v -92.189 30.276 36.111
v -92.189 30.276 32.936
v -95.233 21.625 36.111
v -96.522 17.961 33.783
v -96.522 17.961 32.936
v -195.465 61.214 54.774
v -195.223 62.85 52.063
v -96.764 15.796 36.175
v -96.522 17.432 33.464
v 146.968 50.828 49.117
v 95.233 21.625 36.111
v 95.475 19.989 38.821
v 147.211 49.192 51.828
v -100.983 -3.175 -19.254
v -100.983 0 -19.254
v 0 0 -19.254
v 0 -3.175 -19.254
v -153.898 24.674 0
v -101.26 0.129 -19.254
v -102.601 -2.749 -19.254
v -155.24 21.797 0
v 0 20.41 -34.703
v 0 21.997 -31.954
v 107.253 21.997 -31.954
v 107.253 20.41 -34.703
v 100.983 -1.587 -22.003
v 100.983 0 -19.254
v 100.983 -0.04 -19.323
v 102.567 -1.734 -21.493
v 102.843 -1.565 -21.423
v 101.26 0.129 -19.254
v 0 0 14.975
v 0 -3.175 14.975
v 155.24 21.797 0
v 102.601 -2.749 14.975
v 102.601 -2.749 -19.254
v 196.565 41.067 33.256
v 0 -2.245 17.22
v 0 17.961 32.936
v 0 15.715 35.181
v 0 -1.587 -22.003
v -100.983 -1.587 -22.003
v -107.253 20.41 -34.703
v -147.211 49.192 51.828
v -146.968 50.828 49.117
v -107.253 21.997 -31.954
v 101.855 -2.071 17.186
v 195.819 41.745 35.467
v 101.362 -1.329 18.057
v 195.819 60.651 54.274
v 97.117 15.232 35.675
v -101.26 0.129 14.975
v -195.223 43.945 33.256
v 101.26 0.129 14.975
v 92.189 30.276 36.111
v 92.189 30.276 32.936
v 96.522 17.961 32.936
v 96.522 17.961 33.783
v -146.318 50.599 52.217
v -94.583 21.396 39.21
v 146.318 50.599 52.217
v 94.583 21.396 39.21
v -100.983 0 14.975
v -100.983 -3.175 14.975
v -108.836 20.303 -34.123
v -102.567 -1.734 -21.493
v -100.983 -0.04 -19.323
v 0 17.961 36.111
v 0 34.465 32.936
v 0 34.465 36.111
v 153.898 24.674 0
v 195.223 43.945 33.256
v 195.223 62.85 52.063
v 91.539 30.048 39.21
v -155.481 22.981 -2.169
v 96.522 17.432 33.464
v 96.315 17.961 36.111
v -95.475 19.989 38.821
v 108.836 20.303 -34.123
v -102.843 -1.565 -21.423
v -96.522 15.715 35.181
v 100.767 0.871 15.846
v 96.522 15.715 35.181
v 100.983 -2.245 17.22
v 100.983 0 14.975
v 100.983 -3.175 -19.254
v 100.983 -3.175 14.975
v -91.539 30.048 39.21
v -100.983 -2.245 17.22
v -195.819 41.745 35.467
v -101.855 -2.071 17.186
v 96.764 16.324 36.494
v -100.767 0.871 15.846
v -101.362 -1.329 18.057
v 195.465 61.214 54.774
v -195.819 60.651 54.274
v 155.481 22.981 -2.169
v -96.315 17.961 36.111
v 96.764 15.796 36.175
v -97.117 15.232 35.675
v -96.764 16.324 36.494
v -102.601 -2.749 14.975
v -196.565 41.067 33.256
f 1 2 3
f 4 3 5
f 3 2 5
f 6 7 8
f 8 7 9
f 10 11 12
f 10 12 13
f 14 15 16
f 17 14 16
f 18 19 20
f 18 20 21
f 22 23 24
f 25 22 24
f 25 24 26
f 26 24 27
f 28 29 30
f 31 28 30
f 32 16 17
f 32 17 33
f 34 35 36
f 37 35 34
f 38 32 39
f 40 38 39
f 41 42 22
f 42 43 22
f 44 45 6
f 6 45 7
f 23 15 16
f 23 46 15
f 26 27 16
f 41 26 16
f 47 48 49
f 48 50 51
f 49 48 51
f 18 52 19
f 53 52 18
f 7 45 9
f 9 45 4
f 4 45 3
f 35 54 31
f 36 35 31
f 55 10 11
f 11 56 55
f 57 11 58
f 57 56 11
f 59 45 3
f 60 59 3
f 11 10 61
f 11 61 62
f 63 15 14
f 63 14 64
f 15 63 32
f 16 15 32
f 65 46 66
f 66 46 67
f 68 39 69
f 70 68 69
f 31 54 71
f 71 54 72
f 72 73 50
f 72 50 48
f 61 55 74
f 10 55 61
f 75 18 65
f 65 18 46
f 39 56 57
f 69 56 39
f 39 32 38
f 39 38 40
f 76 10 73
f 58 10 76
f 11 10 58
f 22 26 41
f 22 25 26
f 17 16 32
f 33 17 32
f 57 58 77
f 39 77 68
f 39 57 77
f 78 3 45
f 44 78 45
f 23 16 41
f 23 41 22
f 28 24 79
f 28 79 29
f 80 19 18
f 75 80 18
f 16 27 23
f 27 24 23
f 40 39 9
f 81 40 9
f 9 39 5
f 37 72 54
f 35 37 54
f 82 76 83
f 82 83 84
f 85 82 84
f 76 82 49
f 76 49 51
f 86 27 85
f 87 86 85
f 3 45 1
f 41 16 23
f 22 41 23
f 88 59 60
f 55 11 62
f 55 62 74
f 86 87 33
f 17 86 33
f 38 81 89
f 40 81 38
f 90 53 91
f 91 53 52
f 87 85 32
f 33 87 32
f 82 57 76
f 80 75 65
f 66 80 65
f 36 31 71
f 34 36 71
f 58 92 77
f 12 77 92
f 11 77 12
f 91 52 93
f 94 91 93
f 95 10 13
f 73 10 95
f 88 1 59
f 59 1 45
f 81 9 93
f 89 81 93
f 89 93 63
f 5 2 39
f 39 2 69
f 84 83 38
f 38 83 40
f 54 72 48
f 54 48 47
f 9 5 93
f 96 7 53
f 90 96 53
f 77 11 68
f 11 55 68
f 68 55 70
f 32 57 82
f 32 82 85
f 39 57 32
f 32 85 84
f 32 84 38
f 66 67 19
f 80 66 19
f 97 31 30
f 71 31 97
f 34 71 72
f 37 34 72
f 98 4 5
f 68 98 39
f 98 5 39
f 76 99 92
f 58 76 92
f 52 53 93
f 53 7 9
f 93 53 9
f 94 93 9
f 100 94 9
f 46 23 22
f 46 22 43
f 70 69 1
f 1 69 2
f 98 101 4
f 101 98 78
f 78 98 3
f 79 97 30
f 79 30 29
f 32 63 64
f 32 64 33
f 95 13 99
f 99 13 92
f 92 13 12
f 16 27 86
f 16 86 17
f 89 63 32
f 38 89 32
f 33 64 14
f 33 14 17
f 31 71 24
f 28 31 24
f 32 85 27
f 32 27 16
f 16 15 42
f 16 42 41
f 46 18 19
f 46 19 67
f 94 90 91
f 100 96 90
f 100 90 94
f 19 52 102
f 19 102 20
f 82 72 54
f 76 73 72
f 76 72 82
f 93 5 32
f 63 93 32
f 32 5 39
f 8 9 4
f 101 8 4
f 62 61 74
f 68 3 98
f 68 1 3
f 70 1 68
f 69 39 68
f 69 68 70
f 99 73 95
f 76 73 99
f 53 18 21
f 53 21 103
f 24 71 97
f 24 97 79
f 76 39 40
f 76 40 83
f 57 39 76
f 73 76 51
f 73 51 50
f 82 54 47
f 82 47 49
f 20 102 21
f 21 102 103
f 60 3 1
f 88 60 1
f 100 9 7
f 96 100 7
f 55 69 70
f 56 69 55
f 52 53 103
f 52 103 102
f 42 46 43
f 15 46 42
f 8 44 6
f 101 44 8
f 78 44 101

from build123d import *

# Parameters (mm, degrees)
F0_W      = 100.983351469
F0_H      = 34.2288780957
F1_DEPTH  = 3.175
F4_DEPTH  = 3.175
F8_DEPTH  = 3.175
F11_DEPTH = 3.175
F14_DEPTH = 3.175
F16_DEPTH = 3.175
F19_DEPTH = 3.175
F22_DEPTH = 3.175
F25_DEPTH = 3.175


with BuildPart() as f1:
    # F0 (on Front) → F1 (new body)
    with BuildSketch(Plane.XZ):
        with Locations((-50.4916757345, -2.1393047646)):
            Rectangle(F0_W, F0_H)
    extrude(amount=F1_DEPTH)


with BuildPart() as f4:
    # F3 (on face) → F4 (new body)
    with BuildSketch(Plane(origin=(-18.0362521801, -38.6788676202, 0), x_dir=(-0.906307787, 0.4226182617, 0), z_dir=(0.4226182617, 0.906307787, 0))):
        Polygon((195.5040961035, 33.2562392616), (91.8267977974, 14.9751342833), (91.8267977974, -19.2537438124), (149.9067097902, 0), align=None)
    extrude(amount=-F4_DEPTH)


with BuildPart() as f8:
    # F6 (on face) → F8 (new body)
    with BuildSketch(Plane(origin=(0, -7.4875671417, 7.4875671417), x_dir=(1, 0, 0), z_dir=(0, -0.7071067812, 0.7071067812))):
        Polygon((-96.5219736099, 35.9890190009), (-100.983351469, 10.5890190009), (0, 10.5890190009), (0, 35.9890190009), align=None)
    extrude(amount=F8_DEPTH)



with BuildPart() as f11:
    # F10 (on face) → F11 (new body)
    with BuildSketch(Plane(origin=(0, -8.3371156298, -14.4403078593), x_dir=(1, 0, 0), z_dir=(0, 0.5, 0.8660254038))):
        Polygon((-100.983351469, 9.6268719062), (0, 9.6268719062), (0, 35.0268719062), (-107.2531938553, 35.0268719062), align=None)
    extrude(amount=-F11_DEPTH)


with BuildPart() as f14:
    # F13 (on 3pt) → F14 (new body)
    with BuildSketch(Plane(origin=(-31.703833875, -33.9160182475, -43.4380501771), x_dir=(0.8668020812, -0.3068801846, -0.39303779), z_dir=(-0.4986523359, -0.533446579, -0.6832134332))):
        Polygon((-140.9710929063, -19.4483988721), (-87.1587201056, -37.0030169853), (-79.9254167687, -11.8602901262), (-80.244108451, -11.9506534211), align=None)
    extrude(amount=F14_DEPTH)


with BuildPart() as f16:
    # F15 (on face) → F16 (new body)
    with BuildSketch(Plane(origin=(-5.500999733, -20.318613249, 20.4246570964), x_dir=(0.9822545425, -0.1322741612, 0.1329645066), z_dir=(-0.1875526958, -0.6927487503, 0.6963642403))):
        Polygon((-96.9870953804, 11.7930904108), (-92.6653631393, 35.959390878), (-193.1496663362, 81.2757015228), (-193.1496663362, 54.6088176983), (-97.4885736897, 10.6527448878), align=None)
    extrude(amount=F16_DEPTH)


with BuildPart() as f19:
    # F18 (on face) → F19 (new body)
    with BuildSketch(Plane.XY.offset(32.9356465254)):
        Polygon((-96.5219736099, 17.9605122421), (0, 17.9605122421), (0, 34.4647429883), (-92.1888053417, 30.2764866501), align=None)
    extrude(amount=F19_DEPTH)


with BuildPart() as f8_1:
    add(f8.part)

    add(f16.part)  # F22 merges F16

    add(f19.part)  # F22 merges F19
    # F21 (on face) → F22 (join)
    with BuildSketch(Plane(origin=(-2.0549814691, -13.8844324202, 22.9998788027), x_dir=(0.9970873706, -0.0394157045, 0.065293013), z_dir=(-0.0762677868, -0.5153014503, 0.8536085988))):
        Polygon((-94.7429432184, 32.8355514866), (-93.4499802867, 37.1752105281), (-145.336791873, 68.8980892301), (-193.7324261585, 80.7128189391), (-94.7429432184, 32.2180205924), align=None)
    extrude(amount=F22_DEPTH)


with BuildPart() as f25:
    # F24 (on 3pt) → F25 (new body)
    with BuildSketch(Plane(origin=(2.9060204267, -1.0224343672, 13.8545971996), x_dir=(0.9788141351, 0.015069115, -0.2041955207), z_dir=(0.2047507971, -0.0720381212, 0.9761596284))):
        Polygon((-100.2629544328, 24.2237426686), (-97.1530981802, 32.8520256661), (-153.1184278879, 54.3049855879), align=None)
    extrude(amount=F25_DEPTH)


with BuildPart() as f26_1:
    # F26: instance of F25
    add(f25.part.mirror(Plane.YZ))


with BuildPart() as f26_2:
    # F26: instance of F4
    add(f4.part.mirror(Plane.YZ))


with BuildPart() as f26_3:
    # F26: instance of F14
    add(f14.part.mirror(Plane.YZ))


with BuildPart() as f26_4:
    # F26: instance of F11
    add(f11.part.mirror(Plane.YZ))


with BuildPart() as f26_5:
    # F26: instance of F1
    add(f1.part.mirror(Plane.YZ))


with BuildPart() as f26_6:
    # F26: instance of F8
    add(f8_1.part.mirror(Plane.YZ))


solid = Compound([f1.part, f4.part, f11.part, f14.part, f8_1.part, f25.part, f26_1.part, f26_2.part, f26_3.part, f26_4.part, f26_5.part, f26_6.part])
